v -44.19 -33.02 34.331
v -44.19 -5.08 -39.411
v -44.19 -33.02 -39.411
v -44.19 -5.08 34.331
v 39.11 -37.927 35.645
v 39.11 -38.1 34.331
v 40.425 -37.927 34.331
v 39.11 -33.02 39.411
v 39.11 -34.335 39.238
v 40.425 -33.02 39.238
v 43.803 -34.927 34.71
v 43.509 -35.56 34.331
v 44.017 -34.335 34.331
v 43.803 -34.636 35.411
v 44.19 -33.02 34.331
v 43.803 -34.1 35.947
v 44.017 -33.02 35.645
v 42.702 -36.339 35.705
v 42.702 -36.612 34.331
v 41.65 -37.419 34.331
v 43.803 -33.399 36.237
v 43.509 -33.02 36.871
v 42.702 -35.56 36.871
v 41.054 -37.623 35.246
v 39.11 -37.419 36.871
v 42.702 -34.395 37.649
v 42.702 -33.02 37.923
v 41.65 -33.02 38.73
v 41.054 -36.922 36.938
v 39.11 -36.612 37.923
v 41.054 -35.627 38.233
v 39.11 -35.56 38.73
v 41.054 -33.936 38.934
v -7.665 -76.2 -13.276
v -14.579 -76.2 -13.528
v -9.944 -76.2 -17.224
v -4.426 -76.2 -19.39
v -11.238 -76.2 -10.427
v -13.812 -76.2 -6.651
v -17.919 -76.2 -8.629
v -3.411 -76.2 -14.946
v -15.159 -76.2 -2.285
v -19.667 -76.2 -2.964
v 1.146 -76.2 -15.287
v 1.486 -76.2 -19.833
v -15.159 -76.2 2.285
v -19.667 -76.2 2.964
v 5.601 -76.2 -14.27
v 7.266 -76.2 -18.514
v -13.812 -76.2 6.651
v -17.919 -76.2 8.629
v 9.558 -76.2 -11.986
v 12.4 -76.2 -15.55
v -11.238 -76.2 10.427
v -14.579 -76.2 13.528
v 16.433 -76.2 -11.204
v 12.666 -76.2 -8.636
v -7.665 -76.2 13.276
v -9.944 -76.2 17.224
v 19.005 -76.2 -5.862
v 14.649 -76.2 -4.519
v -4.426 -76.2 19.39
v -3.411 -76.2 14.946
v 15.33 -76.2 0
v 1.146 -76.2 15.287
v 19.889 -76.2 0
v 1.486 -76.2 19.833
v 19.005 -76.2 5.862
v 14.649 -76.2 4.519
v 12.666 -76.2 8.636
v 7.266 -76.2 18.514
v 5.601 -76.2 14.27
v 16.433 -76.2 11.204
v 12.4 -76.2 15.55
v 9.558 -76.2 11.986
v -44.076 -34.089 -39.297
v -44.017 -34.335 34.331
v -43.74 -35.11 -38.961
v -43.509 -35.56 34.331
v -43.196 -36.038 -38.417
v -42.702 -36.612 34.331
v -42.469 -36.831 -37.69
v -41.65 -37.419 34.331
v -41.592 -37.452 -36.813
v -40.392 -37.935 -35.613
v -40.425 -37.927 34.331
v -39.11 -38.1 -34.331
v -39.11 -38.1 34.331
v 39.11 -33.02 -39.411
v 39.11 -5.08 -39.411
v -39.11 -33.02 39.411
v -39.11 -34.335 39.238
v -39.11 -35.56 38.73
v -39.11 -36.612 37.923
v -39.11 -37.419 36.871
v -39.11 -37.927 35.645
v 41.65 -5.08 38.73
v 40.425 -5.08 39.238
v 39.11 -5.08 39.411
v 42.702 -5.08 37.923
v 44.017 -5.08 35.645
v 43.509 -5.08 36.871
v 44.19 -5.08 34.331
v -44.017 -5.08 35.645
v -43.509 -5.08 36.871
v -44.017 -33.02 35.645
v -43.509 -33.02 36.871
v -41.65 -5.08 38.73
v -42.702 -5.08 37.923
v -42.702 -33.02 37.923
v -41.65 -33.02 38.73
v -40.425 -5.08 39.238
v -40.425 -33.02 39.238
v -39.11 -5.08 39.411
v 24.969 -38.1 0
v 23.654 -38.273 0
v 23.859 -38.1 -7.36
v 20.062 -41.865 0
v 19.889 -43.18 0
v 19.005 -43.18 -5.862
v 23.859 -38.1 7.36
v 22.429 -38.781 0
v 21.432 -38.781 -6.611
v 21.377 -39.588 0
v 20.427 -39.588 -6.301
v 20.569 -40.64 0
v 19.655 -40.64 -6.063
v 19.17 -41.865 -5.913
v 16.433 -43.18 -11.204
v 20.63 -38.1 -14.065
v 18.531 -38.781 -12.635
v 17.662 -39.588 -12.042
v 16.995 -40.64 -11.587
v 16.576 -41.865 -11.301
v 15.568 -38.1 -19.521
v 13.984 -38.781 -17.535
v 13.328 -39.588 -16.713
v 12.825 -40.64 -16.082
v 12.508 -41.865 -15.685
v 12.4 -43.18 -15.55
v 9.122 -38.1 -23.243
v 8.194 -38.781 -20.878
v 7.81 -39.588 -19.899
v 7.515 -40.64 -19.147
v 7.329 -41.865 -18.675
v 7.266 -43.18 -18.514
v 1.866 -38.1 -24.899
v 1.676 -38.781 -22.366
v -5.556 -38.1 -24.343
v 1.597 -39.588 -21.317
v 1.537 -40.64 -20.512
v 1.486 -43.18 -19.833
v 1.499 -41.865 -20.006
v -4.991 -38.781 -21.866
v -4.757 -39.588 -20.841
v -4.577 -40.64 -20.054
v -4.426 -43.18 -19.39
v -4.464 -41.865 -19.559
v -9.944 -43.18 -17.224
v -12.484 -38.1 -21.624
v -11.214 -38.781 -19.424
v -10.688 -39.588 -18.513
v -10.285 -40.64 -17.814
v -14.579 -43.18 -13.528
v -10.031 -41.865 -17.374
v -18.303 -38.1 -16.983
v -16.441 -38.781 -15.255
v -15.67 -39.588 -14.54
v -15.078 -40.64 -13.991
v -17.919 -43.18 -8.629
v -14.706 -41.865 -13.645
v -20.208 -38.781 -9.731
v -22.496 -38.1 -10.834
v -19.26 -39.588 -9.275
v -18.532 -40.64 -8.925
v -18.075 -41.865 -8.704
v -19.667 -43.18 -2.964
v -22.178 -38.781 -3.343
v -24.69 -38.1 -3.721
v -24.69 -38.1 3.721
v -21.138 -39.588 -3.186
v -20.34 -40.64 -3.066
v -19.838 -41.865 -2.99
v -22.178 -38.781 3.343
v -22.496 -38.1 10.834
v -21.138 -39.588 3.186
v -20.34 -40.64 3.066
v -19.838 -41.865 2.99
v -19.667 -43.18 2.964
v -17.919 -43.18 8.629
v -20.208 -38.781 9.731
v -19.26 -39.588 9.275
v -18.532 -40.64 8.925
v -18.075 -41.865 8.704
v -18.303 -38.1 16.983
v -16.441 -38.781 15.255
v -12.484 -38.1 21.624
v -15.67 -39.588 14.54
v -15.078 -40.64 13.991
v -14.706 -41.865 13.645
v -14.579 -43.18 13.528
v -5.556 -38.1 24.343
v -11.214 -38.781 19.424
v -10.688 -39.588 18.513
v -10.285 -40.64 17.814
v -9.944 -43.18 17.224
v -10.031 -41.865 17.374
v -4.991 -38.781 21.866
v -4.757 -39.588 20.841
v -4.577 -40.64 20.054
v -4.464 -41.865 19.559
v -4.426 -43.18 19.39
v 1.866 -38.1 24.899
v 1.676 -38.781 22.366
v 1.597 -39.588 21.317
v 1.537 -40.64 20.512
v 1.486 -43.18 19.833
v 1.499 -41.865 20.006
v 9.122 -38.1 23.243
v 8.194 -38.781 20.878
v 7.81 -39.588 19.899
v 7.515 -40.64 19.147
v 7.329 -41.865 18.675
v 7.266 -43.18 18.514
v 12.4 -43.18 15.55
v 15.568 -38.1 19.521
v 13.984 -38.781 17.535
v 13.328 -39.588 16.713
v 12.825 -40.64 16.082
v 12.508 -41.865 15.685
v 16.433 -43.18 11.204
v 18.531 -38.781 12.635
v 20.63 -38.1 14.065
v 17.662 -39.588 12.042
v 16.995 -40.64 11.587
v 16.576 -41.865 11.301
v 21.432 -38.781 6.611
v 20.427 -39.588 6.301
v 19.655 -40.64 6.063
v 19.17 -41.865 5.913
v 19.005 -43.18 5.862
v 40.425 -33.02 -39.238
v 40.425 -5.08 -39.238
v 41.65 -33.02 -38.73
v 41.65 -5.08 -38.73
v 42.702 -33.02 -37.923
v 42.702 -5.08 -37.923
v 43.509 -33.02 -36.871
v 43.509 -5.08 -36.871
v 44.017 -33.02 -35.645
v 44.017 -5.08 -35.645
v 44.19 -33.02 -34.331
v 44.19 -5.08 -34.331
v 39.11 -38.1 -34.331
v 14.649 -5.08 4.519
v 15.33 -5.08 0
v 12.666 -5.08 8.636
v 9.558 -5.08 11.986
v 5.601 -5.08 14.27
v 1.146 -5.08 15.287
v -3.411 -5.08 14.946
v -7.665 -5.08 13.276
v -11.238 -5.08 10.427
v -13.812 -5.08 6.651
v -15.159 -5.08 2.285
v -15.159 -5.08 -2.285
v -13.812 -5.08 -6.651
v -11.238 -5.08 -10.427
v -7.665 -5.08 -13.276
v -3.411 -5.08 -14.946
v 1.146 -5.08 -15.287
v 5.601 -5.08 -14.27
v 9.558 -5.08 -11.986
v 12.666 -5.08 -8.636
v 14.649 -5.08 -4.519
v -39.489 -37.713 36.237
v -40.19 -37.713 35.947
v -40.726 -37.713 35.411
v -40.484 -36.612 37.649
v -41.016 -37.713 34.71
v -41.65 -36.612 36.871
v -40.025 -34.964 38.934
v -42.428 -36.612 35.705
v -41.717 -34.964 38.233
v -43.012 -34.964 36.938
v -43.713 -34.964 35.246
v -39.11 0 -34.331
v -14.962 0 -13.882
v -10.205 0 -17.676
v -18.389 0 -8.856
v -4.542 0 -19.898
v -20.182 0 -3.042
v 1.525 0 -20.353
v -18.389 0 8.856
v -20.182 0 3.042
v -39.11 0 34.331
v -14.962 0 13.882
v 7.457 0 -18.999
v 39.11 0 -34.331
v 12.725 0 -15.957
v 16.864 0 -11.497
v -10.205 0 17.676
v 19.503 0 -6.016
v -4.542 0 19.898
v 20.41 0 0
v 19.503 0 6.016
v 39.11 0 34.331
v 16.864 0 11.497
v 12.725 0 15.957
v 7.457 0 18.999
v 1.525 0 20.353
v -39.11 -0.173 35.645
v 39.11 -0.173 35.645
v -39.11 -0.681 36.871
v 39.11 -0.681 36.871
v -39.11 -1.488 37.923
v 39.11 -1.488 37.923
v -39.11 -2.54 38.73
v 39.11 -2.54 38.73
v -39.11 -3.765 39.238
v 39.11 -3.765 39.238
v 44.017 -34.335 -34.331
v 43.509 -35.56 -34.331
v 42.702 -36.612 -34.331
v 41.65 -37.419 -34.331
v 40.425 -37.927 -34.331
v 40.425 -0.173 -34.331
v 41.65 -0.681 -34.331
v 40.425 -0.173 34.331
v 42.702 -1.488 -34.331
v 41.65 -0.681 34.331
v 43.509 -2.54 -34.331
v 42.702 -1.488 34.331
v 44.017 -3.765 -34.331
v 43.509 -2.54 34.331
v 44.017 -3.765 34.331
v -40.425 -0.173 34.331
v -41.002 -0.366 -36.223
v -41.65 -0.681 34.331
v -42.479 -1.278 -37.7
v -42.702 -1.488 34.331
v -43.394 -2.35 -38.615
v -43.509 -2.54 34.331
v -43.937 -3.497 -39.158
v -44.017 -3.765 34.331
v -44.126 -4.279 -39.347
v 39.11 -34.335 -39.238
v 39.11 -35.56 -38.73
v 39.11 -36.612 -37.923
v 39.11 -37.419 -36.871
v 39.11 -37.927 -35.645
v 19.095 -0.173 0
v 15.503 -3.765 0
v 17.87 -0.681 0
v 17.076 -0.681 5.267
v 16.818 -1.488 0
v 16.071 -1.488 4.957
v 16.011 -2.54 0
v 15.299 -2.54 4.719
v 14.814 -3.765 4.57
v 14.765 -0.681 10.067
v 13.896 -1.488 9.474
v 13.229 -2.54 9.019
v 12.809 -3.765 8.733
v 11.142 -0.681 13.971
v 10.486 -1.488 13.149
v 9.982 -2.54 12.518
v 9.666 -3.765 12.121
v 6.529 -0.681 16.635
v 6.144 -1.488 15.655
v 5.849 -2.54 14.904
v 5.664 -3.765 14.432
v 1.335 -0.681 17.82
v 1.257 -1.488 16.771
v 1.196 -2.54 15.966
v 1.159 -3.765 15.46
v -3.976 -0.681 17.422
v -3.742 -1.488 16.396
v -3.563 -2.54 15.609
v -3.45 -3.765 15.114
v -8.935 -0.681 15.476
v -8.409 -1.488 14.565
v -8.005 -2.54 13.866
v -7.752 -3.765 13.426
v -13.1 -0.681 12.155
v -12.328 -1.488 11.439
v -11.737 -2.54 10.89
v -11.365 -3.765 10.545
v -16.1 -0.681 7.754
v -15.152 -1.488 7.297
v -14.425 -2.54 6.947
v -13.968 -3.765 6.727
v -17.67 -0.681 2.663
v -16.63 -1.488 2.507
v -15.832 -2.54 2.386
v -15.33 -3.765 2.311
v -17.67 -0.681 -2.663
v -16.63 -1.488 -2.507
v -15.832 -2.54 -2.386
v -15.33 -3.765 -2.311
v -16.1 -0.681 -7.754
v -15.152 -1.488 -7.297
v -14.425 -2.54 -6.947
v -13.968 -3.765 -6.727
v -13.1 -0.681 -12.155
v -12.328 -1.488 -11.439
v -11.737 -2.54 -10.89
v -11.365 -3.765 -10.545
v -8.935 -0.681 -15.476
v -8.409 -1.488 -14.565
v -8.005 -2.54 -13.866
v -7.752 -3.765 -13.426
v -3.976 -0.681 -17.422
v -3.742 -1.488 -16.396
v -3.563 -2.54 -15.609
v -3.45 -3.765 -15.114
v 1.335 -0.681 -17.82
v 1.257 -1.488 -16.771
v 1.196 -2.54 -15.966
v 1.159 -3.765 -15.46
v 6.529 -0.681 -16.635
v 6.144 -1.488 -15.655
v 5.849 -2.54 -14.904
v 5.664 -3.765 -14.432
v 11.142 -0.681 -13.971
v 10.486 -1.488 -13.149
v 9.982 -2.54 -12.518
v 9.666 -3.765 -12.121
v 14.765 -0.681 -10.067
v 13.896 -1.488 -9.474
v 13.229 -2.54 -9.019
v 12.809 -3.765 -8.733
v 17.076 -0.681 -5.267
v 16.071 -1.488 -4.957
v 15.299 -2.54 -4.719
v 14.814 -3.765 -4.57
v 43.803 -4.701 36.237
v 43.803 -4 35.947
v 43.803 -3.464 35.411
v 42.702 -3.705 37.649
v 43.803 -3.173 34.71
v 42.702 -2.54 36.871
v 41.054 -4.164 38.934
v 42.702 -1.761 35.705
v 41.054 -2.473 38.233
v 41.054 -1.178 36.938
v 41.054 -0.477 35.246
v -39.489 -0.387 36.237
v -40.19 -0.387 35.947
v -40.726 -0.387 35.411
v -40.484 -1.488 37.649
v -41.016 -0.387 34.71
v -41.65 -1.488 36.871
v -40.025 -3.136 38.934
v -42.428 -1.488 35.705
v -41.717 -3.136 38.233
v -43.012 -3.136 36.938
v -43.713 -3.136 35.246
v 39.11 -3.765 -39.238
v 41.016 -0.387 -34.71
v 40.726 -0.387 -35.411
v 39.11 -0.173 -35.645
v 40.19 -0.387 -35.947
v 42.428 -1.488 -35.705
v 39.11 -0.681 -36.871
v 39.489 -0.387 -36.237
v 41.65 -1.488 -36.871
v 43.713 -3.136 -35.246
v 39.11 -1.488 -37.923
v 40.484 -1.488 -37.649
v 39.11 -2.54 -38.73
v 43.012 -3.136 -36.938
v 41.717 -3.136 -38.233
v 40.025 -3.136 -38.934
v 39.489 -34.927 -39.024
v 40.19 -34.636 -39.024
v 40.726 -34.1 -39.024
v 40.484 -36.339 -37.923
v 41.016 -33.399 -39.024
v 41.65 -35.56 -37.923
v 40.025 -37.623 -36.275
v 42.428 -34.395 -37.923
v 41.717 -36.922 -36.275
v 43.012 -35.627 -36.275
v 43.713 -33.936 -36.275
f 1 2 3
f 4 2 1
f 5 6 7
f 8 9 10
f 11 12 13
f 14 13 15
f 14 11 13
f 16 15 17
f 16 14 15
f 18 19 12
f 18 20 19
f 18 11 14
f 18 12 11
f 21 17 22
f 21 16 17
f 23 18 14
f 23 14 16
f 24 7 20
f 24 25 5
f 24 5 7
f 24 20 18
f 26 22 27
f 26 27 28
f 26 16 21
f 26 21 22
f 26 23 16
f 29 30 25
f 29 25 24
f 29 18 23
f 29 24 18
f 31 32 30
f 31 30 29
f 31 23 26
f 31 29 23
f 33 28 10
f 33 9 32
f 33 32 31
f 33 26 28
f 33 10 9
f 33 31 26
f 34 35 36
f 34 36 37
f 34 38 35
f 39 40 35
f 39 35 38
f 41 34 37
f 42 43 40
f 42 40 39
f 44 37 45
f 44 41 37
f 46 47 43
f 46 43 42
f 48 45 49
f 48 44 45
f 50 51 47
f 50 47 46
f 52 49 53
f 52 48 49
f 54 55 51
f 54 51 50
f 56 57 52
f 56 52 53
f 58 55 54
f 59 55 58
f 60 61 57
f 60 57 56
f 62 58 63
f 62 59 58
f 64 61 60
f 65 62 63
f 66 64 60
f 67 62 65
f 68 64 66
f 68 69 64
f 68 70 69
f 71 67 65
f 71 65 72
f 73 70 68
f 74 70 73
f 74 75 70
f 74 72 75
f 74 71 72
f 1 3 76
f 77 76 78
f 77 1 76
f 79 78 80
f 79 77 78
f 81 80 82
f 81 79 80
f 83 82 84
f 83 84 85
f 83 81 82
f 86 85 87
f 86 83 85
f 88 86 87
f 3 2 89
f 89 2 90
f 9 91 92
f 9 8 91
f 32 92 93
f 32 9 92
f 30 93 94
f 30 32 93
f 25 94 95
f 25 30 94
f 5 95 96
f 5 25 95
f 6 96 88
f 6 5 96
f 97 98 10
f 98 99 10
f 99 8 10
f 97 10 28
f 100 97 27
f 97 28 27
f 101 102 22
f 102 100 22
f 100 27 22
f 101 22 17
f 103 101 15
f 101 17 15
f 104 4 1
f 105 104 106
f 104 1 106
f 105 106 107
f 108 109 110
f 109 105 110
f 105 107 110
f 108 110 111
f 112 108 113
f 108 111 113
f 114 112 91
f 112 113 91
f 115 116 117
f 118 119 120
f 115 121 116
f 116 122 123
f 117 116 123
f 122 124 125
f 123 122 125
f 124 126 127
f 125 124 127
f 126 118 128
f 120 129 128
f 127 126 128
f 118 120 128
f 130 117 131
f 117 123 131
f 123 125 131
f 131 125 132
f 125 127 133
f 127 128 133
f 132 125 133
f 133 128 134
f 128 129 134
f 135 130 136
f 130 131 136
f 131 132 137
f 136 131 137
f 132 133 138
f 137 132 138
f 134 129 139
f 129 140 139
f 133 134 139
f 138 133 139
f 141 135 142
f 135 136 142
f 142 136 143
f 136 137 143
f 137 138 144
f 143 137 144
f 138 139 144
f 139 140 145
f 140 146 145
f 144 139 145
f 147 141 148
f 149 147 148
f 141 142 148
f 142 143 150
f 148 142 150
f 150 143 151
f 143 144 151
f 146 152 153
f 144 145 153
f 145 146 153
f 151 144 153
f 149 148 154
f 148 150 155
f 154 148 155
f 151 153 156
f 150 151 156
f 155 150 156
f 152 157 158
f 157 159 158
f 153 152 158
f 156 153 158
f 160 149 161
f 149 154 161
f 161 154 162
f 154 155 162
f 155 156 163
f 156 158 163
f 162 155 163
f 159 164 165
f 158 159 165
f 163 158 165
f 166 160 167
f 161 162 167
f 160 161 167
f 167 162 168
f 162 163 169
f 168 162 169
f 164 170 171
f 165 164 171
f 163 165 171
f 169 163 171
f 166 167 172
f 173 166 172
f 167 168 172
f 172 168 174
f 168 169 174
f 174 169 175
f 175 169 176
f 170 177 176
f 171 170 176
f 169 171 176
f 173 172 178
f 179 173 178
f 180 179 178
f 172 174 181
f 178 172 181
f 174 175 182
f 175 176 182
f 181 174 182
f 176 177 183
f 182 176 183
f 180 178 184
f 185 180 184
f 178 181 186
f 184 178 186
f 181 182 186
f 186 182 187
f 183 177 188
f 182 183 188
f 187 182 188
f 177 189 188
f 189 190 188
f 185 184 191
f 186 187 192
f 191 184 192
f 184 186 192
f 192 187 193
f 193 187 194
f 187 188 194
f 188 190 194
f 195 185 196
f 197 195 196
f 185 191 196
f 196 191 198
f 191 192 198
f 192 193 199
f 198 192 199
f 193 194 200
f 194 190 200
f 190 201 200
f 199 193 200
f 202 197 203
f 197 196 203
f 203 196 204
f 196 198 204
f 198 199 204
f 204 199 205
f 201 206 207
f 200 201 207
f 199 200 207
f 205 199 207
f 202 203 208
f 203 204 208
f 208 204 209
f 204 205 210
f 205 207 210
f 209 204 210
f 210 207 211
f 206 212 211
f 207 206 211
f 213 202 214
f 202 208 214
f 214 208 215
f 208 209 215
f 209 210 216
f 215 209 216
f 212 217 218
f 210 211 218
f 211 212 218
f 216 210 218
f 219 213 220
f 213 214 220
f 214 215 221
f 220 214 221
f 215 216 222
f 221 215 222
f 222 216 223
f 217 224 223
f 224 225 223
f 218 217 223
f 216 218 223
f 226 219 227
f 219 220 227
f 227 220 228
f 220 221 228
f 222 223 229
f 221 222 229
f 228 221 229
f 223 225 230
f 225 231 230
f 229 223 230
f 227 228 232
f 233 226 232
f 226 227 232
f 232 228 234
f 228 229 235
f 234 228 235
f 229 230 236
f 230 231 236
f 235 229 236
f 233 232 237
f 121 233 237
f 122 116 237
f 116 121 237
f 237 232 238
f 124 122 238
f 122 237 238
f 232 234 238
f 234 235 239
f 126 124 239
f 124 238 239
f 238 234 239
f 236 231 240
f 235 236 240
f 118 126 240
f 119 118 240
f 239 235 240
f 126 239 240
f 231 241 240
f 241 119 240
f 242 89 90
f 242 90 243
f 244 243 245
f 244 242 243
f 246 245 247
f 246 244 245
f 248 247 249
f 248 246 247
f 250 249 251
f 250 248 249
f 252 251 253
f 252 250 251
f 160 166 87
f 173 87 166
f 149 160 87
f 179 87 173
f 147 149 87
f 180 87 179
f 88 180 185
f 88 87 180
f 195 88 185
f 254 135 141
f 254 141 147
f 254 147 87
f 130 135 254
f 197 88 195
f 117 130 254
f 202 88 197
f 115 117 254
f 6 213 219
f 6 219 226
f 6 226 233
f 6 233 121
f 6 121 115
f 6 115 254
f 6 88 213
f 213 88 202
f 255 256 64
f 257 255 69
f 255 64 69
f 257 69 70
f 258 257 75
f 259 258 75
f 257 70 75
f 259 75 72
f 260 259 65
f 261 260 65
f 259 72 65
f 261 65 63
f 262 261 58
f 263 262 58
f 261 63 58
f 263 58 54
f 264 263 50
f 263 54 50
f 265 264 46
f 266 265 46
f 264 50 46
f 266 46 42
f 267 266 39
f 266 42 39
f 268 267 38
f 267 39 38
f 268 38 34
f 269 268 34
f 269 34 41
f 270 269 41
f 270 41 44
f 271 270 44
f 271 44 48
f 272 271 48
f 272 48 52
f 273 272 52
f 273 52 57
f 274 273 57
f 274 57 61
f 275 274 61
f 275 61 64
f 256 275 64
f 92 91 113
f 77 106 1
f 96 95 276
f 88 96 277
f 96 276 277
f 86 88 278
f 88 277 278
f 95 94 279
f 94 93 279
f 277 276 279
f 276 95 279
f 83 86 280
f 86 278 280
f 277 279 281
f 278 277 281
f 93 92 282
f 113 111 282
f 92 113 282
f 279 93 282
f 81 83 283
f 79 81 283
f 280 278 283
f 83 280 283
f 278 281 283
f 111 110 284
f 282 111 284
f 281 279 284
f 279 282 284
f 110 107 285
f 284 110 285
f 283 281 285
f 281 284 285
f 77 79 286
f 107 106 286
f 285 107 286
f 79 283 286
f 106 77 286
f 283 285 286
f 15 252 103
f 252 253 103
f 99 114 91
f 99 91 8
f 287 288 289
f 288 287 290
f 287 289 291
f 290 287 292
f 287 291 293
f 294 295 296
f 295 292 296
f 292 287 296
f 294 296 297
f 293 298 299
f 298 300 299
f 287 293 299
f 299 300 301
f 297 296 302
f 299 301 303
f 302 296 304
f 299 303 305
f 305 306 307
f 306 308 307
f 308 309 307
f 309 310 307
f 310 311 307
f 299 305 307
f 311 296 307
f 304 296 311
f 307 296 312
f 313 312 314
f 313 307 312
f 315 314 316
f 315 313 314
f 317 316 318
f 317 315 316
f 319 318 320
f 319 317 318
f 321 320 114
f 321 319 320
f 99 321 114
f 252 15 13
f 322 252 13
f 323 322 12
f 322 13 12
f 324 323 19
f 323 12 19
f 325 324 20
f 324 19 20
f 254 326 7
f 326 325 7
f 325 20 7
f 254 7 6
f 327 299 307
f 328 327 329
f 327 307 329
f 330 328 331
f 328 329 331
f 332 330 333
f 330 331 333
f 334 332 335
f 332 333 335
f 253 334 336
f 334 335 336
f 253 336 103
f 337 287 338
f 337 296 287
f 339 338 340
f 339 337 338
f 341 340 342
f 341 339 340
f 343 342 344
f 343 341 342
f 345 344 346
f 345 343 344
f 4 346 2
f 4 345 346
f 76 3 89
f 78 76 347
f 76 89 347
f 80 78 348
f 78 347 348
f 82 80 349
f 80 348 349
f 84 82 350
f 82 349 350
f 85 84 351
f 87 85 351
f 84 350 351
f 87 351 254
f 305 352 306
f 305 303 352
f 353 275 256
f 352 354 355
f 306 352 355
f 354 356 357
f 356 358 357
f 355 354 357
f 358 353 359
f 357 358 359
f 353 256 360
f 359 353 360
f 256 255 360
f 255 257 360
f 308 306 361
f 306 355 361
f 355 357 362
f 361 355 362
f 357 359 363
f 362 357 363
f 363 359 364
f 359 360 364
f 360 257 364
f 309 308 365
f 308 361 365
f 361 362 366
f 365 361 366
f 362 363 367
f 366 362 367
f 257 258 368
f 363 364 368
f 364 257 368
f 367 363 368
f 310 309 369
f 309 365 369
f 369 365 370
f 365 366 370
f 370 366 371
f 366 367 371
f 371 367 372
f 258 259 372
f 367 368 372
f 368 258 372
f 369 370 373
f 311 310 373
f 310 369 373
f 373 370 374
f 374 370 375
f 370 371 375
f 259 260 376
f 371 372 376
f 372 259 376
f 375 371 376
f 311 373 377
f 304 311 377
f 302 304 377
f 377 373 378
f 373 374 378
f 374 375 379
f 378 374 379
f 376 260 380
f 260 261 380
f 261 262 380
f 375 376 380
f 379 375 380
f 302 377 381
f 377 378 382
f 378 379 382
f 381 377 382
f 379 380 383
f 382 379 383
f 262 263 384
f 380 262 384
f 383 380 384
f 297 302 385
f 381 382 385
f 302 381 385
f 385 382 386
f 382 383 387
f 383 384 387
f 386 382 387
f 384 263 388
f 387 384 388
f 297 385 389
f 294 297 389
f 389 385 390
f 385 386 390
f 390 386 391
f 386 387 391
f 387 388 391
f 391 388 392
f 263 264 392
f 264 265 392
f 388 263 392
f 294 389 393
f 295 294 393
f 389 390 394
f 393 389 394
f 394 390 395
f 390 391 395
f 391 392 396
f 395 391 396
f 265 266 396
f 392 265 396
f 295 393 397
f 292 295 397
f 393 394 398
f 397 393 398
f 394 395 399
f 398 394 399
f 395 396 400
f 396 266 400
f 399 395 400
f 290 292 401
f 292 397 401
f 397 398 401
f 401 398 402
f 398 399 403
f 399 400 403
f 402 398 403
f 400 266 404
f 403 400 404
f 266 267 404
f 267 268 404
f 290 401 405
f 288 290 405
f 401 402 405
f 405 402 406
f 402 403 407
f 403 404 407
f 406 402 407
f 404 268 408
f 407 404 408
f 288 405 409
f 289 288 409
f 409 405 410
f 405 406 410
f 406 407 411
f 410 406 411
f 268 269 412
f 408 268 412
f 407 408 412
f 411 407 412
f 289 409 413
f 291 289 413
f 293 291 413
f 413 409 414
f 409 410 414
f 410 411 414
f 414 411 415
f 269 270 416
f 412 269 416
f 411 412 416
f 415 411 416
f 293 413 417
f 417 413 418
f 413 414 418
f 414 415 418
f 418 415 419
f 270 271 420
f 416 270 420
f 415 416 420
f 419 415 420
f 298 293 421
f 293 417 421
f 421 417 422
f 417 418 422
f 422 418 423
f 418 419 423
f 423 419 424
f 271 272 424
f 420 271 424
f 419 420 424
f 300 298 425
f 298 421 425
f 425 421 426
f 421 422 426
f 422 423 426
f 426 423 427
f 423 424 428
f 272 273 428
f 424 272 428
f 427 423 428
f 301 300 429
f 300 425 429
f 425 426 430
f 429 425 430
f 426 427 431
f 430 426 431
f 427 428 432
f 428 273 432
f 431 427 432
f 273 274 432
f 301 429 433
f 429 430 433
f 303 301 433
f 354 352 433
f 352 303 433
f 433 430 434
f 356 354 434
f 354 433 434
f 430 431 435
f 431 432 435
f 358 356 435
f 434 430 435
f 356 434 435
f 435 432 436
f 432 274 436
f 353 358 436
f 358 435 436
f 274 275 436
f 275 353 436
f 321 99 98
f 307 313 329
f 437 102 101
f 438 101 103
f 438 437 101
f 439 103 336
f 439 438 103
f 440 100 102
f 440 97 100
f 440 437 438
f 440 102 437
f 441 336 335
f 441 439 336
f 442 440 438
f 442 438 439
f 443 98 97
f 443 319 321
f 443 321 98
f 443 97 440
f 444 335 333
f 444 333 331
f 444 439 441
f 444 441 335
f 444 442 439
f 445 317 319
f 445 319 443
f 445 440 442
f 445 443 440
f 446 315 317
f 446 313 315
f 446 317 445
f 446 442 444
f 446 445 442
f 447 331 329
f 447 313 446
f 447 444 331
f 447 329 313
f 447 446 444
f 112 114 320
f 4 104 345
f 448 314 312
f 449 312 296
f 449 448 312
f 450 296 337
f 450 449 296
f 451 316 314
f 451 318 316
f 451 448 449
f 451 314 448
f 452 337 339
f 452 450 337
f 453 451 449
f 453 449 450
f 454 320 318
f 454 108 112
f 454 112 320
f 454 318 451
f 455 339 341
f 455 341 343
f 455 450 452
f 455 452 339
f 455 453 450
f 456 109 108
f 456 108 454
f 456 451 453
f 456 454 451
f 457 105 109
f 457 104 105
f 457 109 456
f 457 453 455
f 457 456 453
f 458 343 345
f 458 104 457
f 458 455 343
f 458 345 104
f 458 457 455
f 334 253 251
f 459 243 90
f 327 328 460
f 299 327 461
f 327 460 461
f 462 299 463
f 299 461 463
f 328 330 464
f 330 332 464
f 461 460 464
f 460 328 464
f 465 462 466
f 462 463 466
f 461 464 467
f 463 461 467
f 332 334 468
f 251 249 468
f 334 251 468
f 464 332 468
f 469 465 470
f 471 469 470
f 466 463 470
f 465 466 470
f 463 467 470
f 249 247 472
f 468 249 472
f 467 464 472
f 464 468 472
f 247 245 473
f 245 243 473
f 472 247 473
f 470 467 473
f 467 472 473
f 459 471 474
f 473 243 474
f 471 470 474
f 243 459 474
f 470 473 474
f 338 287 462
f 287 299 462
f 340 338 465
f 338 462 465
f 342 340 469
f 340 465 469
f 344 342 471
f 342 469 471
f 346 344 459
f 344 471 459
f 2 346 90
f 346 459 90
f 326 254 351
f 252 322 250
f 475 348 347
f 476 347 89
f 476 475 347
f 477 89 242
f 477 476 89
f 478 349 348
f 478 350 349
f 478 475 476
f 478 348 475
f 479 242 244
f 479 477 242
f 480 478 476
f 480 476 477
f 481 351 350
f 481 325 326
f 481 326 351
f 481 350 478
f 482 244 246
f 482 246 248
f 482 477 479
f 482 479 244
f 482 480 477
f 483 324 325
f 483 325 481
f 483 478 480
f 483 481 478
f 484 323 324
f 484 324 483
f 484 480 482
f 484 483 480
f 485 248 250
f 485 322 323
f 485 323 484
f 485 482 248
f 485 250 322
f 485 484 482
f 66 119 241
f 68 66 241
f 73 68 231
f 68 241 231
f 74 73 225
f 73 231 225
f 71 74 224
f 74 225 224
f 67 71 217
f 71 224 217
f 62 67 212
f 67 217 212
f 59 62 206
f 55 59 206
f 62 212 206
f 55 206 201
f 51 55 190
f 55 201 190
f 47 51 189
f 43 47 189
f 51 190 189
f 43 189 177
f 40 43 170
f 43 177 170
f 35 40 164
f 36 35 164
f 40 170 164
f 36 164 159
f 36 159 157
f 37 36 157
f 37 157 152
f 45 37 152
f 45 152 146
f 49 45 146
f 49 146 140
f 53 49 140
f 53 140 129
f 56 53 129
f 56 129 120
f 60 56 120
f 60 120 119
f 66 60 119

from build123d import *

# Parameters (mm, degrees)
F0_W     = 88.3796066046
F0_H     = 78.8212642074
F1_DEPTH = 38.1
F2_R     = 19.8886852244
F3_DEPTH = 76.2
F4_R     = 15.3300862408
F5_DEPTH = 101.6
F6_R     = 5.08


with BuildPart() as f1:
    # F0 (on Front) → F1 (new body)
    with BuildSketch(Plane.XZ):
        Rectangle(F0_W, F0_H)
    extrude(amount=F1_DEPTH)

    # F2 (on Front) → F3 (join)
    with BuildSketch(Plane.XZ):
        Circle(F2_R)
    extrude(amount=F3_DEPTH)

    # F4 (on face) → F5 (cut)
    with BuildSketch(Plane.XZ.offset(76.2)):
        Circle(F4_R)
    extrude(amount=-F5_DEPTH, mode=Mode.SUBTRACT)

    # F6
    f6_edges = [f1.edges().sort_by_distance(p)[0] for p in [
        (-44.189803, -19.05, 39.410632),
        (0, 0, 39.410632),
        (0, -38.1, 39.410632),
        (44.189803, -38.1, 0),
        (-44.189803, -38.1, 0),
        (0, -38.1, -39.410632),
        (-19.888685, -38.1, 0),
        (44.189803, -19.05, -39.410632),
        (44.189803, -19.05, 39.410632),
        (44.189803, 0, 0),
        (-44.189803, 0, 0),
        (0, 0, -39.410632),
        (-15.330086, 0, 0),
    ]]
    fillet(f6_edges, radius=F6_R)


solid = f1.part
